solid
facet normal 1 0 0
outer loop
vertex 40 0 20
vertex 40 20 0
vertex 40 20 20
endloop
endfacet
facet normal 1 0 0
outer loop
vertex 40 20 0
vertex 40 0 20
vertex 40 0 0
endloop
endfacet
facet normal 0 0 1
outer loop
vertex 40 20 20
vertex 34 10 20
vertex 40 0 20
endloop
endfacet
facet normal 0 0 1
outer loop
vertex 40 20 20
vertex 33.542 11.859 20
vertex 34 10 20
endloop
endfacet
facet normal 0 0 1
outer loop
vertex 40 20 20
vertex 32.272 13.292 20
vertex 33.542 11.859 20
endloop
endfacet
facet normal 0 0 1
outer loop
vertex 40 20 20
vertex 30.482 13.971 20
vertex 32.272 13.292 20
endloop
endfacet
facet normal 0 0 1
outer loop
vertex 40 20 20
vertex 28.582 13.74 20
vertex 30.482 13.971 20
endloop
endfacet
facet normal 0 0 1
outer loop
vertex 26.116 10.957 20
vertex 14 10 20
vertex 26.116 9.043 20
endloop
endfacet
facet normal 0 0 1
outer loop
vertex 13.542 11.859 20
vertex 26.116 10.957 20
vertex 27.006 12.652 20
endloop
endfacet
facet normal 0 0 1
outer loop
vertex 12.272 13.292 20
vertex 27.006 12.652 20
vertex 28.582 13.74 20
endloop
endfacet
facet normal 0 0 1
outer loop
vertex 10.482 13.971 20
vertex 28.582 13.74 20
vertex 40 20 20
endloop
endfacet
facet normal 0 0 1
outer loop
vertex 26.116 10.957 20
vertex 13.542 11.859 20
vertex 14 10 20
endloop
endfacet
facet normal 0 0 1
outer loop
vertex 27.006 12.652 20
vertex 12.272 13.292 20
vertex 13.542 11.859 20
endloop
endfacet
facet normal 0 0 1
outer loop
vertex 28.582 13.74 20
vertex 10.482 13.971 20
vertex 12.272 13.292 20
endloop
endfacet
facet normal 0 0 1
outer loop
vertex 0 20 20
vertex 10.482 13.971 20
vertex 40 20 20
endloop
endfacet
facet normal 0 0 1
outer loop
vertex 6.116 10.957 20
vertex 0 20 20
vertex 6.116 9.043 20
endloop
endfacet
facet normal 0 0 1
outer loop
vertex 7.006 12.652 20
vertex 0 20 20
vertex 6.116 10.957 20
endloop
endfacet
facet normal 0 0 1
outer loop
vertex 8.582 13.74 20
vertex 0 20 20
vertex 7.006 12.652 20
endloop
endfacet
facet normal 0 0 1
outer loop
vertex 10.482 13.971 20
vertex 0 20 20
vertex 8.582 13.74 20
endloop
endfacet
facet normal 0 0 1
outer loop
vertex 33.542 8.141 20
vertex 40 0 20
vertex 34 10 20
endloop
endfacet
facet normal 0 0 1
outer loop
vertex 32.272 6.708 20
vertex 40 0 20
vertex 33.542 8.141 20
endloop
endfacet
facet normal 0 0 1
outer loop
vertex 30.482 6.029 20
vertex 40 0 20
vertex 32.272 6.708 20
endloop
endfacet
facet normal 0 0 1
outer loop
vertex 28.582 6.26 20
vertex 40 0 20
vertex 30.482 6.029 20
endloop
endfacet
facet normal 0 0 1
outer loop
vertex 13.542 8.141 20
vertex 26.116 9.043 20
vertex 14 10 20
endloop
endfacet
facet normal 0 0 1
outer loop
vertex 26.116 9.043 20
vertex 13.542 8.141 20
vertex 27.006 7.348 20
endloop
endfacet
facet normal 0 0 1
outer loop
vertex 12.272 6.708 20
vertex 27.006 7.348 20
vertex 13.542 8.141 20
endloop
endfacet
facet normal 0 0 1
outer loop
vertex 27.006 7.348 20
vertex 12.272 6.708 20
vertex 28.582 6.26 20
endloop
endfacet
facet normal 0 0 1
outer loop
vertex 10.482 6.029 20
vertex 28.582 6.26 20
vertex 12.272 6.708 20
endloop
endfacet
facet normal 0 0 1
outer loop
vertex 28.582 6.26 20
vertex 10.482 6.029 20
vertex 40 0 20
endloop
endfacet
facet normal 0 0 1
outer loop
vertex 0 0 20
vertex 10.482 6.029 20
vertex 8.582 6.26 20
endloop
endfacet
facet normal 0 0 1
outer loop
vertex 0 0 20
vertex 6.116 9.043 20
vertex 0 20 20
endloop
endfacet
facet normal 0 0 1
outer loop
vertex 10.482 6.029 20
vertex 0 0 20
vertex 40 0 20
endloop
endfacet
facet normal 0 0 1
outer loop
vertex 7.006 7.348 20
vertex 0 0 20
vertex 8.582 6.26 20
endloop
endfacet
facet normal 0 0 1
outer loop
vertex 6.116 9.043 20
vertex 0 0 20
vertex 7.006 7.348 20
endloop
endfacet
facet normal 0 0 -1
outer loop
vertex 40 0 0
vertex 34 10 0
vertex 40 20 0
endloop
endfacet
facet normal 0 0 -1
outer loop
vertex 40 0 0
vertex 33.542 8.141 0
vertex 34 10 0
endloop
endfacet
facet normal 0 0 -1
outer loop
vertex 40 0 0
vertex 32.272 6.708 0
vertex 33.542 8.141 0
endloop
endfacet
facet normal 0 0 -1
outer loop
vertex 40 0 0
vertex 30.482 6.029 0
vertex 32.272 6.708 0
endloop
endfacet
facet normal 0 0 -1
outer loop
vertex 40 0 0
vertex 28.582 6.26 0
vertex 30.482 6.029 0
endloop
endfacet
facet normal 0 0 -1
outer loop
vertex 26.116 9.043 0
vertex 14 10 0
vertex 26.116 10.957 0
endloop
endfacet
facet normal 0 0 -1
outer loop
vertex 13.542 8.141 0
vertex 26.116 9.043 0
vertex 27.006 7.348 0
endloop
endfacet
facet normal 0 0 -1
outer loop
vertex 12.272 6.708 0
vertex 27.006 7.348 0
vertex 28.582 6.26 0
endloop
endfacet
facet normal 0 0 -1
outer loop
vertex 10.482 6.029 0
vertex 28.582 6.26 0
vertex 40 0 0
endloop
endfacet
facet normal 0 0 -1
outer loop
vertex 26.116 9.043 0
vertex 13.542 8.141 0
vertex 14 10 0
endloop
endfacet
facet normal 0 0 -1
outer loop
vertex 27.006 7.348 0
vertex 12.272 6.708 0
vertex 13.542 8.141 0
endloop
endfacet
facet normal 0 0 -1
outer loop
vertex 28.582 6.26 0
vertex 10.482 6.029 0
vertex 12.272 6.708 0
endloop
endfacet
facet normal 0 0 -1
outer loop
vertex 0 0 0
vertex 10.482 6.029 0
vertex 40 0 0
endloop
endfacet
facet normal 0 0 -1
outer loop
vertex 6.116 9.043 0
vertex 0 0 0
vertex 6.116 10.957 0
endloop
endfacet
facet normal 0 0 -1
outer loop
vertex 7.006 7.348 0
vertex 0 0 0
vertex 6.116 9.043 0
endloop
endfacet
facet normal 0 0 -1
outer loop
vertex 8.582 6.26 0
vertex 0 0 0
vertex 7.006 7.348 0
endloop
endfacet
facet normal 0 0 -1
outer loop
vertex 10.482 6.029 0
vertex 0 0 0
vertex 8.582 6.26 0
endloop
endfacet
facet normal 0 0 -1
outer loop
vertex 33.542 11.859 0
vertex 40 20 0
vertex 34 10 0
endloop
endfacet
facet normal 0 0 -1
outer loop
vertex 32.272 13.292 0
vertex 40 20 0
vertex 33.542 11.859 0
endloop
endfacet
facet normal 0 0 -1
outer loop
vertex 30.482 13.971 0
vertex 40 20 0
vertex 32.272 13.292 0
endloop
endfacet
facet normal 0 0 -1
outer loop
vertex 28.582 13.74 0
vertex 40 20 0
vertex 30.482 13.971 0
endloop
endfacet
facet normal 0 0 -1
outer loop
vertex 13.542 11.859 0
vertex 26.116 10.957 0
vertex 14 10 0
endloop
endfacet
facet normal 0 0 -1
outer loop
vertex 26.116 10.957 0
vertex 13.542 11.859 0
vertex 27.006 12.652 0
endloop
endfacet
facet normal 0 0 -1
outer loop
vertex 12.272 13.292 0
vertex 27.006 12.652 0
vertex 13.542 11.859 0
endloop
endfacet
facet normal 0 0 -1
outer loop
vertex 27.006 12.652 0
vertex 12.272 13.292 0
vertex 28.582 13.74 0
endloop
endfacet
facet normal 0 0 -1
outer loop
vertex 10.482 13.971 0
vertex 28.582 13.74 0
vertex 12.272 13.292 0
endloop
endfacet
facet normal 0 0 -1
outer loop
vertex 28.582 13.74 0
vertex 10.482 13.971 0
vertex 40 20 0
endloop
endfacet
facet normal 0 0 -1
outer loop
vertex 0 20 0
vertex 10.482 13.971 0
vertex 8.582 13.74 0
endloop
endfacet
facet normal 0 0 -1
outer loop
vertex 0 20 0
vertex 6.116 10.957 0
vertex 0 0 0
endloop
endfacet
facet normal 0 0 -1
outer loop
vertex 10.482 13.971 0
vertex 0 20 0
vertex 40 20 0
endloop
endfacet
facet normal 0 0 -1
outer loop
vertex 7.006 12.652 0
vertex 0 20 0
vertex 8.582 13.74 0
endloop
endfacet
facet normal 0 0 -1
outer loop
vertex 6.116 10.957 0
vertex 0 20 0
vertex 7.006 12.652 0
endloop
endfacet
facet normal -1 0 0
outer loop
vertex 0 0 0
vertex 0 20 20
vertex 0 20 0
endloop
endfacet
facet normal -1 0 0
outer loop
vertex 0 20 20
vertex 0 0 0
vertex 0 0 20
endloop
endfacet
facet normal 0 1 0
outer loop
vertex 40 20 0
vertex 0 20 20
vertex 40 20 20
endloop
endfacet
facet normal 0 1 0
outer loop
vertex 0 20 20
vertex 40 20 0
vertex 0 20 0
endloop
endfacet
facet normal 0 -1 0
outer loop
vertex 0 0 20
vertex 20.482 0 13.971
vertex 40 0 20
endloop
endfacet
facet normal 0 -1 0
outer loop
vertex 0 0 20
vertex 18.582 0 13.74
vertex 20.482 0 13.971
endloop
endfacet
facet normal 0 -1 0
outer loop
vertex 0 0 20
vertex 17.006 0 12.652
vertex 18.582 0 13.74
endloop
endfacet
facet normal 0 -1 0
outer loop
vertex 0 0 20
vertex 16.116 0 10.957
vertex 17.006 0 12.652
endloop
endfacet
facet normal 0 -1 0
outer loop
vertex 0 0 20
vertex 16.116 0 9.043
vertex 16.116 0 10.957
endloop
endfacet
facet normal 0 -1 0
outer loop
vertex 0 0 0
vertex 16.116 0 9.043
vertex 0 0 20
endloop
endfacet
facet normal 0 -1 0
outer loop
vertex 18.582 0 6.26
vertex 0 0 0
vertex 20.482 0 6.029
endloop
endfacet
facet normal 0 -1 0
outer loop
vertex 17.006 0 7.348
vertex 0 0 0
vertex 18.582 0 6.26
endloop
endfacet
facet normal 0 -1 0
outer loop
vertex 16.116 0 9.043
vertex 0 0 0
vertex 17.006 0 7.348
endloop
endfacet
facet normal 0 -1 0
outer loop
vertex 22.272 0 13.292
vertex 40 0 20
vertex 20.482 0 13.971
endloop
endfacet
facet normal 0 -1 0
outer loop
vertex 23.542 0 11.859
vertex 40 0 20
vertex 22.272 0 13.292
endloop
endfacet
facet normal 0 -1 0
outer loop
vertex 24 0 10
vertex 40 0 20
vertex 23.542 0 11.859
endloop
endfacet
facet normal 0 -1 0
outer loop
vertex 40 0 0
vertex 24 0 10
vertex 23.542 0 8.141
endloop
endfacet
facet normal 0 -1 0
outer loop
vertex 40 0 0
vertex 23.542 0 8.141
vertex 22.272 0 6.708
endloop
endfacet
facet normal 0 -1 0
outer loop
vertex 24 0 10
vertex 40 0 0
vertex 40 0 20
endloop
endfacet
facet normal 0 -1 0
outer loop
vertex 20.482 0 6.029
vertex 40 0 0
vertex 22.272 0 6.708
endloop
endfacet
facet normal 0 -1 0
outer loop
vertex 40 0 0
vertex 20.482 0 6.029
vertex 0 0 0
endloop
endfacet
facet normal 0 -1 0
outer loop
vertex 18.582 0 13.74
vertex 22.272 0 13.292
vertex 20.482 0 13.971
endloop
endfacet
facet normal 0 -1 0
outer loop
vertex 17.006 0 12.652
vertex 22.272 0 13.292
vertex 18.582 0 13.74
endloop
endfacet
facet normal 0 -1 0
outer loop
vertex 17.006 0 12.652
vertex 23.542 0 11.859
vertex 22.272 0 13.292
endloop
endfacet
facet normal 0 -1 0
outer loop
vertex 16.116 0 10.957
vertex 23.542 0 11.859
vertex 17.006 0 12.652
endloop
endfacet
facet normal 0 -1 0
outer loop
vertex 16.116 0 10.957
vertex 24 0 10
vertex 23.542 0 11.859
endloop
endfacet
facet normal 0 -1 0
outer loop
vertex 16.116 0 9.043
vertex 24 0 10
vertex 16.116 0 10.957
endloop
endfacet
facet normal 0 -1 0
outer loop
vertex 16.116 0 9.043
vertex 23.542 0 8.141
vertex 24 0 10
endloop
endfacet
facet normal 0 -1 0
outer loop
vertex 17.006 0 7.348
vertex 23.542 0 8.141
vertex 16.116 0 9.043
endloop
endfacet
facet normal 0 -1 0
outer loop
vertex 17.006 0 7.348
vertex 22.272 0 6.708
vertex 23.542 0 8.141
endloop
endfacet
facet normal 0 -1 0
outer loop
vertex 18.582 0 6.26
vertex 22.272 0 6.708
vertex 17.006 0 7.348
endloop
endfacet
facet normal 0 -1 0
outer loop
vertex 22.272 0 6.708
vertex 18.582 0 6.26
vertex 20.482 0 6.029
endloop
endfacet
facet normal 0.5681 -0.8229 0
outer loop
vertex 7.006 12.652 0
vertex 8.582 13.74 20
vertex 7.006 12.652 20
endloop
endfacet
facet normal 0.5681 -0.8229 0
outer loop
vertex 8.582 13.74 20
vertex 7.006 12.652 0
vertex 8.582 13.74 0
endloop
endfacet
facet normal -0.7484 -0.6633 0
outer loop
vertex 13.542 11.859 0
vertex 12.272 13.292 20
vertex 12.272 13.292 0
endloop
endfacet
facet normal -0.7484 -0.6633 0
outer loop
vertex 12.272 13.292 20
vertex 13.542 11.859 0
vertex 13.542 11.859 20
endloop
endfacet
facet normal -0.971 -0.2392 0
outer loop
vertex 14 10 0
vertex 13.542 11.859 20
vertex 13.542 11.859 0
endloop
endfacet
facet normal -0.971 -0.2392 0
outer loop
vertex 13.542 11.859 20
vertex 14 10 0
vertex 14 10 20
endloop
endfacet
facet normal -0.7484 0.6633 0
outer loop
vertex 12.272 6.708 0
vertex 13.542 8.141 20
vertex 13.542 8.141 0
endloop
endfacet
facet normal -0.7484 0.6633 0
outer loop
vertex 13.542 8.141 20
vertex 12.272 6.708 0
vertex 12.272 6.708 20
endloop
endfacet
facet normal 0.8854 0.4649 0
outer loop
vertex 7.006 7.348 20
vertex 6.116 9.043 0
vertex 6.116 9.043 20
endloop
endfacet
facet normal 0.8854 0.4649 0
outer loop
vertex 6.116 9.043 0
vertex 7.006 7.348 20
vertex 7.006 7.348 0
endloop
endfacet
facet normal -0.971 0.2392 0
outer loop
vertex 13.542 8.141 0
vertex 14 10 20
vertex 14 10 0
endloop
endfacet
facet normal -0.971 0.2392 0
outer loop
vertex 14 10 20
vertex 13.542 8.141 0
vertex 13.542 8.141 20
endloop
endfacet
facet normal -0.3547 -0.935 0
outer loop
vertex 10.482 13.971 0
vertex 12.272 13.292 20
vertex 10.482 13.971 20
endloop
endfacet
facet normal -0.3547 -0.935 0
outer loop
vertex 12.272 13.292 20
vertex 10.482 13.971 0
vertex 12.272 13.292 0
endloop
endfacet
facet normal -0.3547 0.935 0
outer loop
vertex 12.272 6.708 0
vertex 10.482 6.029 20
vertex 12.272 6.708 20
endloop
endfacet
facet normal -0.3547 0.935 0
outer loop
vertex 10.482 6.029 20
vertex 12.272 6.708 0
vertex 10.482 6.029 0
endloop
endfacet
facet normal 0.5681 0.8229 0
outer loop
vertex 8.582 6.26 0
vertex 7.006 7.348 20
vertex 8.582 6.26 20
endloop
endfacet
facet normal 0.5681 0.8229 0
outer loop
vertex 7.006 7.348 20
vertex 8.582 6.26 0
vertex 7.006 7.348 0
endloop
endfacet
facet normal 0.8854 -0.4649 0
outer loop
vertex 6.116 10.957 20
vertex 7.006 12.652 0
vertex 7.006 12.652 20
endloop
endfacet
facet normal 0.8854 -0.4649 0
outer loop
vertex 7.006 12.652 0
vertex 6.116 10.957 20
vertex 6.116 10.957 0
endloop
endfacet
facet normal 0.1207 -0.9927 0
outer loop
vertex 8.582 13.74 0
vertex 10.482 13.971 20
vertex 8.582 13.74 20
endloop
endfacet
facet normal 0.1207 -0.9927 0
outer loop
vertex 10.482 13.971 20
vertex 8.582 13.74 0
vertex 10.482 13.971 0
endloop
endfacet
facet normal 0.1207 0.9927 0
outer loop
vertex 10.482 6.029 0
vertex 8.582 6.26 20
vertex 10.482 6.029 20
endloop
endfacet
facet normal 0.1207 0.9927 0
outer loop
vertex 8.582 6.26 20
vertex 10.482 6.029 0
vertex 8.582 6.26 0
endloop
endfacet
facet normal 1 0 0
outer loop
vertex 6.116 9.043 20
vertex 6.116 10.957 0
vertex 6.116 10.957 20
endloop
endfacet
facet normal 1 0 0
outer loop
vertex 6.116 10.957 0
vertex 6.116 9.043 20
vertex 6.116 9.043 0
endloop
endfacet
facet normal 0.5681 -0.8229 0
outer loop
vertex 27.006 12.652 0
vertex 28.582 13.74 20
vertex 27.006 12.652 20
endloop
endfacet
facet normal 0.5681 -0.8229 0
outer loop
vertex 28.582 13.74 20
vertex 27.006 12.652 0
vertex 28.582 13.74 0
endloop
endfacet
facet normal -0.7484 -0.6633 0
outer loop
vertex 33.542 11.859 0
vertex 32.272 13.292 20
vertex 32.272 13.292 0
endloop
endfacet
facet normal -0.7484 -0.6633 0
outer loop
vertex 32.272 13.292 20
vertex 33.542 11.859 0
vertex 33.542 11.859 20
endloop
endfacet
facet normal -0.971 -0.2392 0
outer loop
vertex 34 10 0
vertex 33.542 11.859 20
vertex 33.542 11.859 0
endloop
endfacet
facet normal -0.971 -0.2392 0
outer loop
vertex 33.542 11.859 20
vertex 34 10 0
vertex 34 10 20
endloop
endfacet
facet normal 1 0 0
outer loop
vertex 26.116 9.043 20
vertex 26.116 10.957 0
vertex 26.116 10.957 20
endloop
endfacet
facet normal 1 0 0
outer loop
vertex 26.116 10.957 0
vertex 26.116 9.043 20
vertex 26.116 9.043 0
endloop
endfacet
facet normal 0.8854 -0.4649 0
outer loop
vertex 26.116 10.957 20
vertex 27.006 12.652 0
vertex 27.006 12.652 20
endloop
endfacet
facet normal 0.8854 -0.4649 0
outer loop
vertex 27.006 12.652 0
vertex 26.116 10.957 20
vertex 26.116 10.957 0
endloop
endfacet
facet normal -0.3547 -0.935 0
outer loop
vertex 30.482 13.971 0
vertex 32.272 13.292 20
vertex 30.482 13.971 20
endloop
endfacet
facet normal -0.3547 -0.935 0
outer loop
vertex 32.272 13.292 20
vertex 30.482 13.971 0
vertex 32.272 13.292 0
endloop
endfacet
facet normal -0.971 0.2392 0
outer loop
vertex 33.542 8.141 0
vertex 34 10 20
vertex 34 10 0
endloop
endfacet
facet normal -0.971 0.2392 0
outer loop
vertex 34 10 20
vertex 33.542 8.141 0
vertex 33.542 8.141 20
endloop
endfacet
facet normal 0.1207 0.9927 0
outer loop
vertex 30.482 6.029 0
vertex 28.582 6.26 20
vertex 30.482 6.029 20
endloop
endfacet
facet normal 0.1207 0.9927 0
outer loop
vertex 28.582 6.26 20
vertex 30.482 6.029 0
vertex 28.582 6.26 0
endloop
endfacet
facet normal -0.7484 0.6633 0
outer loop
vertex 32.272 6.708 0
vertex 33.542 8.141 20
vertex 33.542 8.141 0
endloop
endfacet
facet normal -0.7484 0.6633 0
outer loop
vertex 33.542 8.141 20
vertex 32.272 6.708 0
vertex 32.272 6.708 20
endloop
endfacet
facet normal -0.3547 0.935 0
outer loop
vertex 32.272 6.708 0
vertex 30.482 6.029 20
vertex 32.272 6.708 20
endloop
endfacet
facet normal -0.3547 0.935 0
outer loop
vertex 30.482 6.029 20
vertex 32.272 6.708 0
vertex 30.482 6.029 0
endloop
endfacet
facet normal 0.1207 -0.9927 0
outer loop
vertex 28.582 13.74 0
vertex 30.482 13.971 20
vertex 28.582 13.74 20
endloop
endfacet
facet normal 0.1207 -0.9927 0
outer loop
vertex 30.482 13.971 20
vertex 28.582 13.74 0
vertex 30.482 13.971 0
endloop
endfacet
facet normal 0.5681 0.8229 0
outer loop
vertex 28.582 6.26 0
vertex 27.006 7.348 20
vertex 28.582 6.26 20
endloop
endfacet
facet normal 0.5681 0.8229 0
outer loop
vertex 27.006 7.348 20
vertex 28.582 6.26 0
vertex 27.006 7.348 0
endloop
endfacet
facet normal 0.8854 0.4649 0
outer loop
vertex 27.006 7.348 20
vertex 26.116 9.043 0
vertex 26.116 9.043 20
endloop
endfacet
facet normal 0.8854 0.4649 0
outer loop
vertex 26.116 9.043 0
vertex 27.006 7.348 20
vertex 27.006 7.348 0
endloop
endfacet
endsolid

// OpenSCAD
difference() {
    
    //Base     X, Y, Z               X, Y, Z
    translate([0, 0, 0])cube(size = [40,20,20]);
    
    //Hole1    X,  Y,  Z
    translate([10, 10, 0])cylinder(h = 40, r = 4);
    
    //Hole2    X,  Y,  Z
    translate([30, 10, 0])cylinder(h = 40, r = 4);
    
    
    //Hole3    X,  Y,  Z
    rotate([90, 0, 0]) translate([20, 10, 0])cylinder(h = 200, r = 4);
    
    
}

//http://blog.cubehero.com/2013/11/19/know-only-10-things-to-be-dangerous-in-openscad/
